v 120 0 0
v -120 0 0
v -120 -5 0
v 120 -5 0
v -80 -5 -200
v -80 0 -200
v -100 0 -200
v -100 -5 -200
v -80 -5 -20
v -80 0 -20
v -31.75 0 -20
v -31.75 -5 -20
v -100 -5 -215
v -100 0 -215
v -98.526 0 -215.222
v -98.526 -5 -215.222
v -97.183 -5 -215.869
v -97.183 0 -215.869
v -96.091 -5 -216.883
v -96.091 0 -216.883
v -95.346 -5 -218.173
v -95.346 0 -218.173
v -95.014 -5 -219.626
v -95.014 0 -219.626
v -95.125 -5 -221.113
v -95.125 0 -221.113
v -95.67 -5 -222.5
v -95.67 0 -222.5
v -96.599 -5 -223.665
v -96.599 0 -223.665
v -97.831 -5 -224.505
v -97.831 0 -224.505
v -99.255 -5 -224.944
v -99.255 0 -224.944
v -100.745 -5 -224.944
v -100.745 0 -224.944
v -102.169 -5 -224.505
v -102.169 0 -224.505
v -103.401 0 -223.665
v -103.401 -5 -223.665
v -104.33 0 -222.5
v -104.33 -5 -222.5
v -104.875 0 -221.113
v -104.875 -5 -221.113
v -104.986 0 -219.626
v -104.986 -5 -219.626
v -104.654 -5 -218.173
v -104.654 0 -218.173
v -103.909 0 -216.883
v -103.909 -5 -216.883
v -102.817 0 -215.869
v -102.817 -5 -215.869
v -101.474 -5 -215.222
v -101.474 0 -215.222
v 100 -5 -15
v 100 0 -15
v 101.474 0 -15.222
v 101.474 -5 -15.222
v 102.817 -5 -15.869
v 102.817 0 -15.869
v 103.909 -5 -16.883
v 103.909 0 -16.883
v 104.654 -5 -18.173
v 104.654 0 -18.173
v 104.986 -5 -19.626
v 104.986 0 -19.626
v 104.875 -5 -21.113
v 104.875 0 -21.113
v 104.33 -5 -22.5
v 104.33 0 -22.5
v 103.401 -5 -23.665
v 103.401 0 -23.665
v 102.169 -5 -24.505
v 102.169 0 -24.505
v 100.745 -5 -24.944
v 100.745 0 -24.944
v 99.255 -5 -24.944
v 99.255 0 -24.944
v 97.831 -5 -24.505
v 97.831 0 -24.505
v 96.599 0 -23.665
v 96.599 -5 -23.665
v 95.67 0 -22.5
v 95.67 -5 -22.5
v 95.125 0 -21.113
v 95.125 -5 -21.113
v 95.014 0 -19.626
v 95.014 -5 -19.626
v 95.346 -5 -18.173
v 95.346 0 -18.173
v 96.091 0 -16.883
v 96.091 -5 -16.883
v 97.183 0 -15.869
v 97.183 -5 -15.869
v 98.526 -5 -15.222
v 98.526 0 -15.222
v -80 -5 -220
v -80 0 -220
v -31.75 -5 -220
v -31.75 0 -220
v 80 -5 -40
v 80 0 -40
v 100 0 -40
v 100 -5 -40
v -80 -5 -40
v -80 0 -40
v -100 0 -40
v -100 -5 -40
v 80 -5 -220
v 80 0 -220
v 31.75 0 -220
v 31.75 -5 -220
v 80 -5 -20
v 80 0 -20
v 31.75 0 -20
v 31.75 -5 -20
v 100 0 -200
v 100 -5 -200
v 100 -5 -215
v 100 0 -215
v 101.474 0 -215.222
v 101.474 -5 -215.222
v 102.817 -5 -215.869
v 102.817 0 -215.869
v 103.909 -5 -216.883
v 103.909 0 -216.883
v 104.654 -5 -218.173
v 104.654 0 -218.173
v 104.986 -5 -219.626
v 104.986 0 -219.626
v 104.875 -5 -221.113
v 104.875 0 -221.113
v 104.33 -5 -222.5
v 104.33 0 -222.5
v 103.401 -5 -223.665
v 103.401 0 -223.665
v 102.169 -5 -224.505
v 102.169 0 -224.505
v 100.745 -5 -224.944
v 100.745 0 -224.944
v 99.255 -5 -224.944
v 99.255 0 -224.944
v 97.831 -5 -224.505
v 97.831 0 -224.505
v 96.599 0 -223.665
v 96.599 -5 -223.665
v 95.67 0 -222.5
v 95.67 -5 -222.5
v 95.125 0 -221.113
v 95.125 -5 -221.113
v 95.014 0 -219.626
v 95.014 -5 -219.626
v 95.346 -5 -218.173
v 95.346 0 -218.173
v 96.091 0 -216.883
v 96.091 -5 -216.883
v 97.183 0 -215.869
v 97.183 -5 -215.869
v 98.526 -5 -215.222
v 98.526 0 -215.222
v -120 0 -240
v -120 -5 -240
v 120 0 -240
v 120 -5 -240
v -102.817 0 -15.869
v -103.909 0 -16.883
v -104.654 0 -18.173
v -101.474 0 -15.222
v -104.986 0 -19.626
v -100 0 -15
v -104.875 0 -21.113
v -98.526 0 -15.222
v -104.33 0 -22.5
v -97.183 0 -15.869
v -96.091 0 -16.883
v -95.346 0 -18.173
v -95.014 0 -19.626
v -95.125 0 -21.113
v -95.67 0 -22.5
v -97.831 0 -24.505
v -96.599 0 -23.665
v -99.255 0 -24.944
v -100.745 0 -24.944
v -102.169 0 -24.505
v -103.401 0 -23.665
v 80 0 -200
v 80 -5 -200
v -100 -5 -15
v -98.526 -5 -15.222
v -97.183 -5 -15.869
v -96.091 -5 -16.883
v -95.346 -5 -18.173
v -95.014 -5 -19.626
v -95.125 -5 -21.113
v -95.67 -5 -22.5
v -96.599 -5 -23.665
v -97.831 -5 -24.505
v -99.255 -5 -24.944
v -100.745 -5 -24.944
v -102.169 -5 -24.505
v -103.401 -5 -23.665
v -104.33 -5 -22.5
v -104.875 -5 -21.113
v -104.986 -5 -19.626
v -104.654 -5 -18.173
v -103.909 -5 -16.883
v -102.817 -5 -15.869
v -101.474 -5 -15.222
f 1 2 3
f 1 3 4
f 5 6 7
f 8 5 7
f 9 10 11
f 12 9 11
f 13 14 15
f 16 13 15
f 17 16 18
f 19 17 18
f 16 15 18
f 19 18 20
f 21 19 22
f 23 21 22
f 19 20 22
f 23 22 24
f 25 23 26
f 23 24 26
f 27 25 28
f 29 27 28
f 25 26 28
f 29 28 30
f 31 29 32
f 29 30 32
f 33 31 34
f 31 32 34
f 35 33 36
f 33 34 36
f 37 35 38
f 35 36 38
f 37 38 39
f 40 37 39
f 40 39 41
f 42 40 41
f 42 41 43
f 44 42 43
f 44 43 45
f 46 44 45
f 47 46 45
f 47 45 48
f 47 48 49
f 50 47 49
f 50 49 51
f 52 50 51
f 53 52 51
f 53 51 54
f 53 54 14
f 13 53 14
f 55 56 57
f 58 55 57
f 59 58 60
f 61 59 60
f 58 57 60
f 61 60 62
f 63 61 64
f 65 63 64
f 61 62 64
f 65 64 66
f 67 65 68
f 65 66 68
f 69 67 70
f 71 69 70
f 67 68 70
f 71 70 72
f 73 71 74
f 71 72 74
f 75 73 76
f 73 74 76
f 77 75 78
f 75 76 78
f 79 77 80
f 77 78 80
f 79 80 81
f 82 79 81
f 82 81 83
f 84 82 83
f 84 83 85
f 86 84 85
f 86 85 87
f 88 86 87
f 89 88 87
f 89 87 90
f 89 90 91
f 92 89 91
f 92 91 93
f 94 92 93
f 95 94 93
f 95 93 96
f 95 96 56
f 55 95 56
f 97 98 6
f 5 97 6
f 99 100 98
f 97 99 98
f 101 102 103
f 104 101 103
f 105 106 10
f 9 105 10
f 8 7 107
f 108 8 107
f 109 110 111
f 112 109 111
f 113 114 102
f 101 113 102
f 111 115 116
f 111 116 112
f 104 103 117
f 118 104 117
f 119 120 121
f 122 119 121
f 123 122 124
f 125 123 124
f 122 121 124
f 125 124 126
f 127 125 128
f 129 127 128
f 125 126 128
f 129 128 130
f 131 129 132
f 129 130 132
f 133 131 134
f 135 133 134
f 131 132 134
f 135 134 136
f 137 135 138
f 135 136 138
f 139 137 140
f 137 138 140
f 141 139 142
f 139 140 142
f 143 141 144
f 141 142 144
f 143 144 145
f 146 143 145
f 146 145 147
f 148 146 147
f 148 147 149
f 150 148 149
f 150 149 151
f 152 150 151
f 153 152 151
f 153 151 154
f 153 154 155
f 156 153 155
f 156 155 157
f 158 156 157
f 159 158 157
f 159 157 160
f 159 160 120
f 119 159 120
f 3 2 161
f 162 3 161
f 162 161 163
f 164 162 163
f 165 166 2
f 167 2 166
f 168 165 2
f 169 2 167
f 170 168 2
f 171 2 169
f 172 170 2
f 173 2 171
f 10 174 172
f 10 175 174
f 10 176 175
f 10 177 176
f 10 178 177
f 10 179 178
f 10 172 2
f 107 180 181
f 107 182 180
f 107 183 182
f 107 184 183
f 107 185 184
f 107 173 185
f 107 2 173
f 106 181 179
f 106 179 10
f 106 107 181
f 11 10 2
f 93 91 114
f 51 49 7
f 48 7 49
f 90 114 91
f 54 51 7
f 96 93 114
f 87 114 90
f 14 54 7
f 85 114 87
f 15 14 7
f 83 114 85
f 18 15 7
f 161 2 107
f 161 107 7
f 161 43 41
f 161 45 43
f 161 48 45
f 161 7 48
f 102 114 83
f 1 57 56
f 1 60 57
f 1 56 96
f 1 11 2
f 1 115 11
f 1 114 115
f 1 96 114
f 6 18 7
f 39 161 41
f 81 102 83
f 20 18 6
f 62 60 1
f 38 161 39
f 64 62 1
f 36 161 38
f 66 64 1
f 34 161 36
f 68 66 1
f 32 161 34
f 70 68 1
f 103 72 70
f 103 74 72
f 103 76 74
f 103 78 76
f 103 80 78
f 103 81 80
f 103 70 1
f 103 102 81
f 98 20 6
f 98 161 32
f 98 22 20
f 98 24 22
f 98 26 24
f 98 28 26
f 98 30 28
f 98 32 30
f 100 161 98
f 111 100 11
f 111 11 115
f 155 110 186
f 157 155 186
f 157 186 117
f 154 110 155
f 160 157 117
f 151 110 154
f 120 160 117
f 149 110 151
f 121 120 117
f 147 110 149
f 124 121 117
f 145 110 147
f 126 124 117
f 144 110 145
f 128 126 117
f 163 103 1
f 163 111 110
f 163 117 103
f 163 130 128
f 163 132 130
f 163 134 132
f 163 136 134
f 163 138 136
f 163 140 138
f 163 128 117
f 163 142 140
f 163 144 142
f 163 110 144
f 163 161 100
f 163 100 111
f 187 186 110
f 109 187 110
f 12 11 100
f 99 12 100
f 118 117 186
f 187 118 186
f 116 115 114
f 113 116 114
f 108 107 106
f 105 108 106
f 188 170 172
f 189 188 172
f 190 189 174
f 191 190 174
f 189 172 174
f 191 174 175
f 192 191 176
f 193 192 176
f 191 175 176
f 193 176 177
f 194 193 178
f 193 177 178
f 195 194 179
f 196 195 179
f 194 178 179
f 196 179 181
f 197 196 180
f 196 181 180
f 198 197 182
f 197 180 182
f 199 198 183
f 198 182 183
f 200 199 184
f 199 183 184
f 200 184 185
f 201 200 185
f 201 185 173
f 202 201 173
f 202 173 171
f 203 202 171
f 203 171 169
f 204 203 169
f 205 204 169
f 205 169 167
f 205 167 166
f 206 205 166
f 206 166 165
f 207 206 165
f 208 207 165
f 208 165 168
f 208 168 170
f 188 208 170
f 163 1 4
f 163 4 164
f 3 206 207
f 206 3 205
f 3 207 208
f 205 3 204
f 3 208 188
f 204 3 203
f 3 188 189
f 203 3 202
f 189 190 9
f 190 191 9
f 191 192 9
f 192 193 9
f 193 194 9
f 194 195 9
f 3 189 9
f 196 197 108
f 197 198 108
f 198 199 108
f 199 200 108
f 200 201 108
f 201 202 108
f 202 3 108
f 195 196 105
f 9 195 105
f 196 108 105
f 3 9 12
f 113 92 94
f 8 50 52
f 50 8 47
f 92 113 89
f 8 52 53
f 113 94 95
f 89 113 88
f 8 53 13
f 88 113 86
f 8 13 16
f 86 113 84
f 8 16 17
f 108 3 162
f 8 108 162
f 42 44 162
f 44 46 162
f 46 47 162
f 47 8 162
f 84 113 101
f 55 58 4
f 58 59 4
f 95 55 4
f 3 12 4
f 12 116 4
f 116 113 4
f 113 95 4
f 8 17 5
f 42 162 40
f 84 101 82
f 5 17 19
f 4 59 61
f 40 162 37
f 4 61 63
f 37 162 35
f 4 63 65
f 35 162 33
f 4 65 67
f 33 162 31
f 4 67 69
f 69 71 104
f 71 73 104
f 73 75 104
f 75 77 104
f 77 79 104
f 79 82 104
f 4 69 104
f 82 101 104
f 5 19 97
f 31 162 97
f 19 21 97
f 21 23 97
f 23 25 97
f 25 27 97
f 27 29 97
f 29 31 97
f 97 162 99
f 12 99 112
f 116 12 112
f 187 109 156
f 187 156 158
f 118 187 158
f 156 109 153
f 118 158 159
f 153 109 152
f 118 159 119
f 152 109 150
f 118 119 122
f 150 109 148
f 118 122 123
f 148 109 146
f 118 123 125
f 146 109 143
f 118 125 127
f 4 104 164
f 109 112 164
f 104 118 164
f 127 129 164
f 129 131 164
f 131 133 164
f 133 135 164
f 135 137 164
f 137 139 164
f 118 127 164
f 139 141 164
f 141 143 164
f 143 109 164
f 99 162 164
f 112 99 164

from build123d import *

# Parameters (mm, degrees)
SKETCH2_W           = 240
SKETCH2_H           = 240
BOSS_EXTRUDE1_DEPTH = 5
SKETCH3_W           = 63.5
SKETCH3_H           = 200
BOSS_EXTRUDE2_DEPTH = 5
SKETCH10_R          = 5
CUT_EXTRUDE1_DEPTH  = 10


with BuildPart() as part:
    # Sketch2 → Boss-Extrude1 (new body)
    with BuildSketch(Plane(origin=(0, 0, 0), x_dir=(1, 0, 0), z_dir=(0, 1, 0))):
        with Locations((0, 120)):
            Rectangle(SKETCH2_W, SKETCH2_H)
        Polygon((-100, 200), (-100, 40), (-80, 40), (-80, 20), (80, 20), (80, 40), (100, 40), (100, 200), (80, 200), (80, 220), (-80, 220), (-80, 200), align=None, mode=Mode.SUBTRACT)
    extrude(amount=-BOSS_EXTRUDE1_DEPTH)

    # Sketch3 → Boss-Extrude2 (add)
    with BuildSketch(Plane(origin=(0, 0, 0), x_dir=(1, 0, 0), z_dir=(0, 1, 0))):
        with Locations((0, 120)):
            Rectangle(SKETCH3_W, SKETCH3_H)
    extrude(amount=-BOSS_EXTRUDE2_DEPTH)

    # Sketch10 → Cut-Extrude1 (cut)
    with BuildSketch(Plane(origin=(0, 0, 0), x_dir=(1, 0, 0), z_dir=(0, 1, 0))):
        with Locations(Location((-100, 20, 0), (0, 0, 270))):
            Circle(SKETCH10_R)
        with Locations(Location((100, 20, 0), (0, 0, 270))):
            Circle(SKETCH10_R)
        with Locations(Location((-100, 220, 0), (0, 0, 270))):
            Circle(SKETCH10_R)
        with Locations(Location((100, 220, 0), (0, 0, 270))):
            Circle(SKETCH10_R)
    extrude(amount=-CUT_EXTRUDE1_DEPTH, mode=Mode.SUBTRACT)


solid = part.part
